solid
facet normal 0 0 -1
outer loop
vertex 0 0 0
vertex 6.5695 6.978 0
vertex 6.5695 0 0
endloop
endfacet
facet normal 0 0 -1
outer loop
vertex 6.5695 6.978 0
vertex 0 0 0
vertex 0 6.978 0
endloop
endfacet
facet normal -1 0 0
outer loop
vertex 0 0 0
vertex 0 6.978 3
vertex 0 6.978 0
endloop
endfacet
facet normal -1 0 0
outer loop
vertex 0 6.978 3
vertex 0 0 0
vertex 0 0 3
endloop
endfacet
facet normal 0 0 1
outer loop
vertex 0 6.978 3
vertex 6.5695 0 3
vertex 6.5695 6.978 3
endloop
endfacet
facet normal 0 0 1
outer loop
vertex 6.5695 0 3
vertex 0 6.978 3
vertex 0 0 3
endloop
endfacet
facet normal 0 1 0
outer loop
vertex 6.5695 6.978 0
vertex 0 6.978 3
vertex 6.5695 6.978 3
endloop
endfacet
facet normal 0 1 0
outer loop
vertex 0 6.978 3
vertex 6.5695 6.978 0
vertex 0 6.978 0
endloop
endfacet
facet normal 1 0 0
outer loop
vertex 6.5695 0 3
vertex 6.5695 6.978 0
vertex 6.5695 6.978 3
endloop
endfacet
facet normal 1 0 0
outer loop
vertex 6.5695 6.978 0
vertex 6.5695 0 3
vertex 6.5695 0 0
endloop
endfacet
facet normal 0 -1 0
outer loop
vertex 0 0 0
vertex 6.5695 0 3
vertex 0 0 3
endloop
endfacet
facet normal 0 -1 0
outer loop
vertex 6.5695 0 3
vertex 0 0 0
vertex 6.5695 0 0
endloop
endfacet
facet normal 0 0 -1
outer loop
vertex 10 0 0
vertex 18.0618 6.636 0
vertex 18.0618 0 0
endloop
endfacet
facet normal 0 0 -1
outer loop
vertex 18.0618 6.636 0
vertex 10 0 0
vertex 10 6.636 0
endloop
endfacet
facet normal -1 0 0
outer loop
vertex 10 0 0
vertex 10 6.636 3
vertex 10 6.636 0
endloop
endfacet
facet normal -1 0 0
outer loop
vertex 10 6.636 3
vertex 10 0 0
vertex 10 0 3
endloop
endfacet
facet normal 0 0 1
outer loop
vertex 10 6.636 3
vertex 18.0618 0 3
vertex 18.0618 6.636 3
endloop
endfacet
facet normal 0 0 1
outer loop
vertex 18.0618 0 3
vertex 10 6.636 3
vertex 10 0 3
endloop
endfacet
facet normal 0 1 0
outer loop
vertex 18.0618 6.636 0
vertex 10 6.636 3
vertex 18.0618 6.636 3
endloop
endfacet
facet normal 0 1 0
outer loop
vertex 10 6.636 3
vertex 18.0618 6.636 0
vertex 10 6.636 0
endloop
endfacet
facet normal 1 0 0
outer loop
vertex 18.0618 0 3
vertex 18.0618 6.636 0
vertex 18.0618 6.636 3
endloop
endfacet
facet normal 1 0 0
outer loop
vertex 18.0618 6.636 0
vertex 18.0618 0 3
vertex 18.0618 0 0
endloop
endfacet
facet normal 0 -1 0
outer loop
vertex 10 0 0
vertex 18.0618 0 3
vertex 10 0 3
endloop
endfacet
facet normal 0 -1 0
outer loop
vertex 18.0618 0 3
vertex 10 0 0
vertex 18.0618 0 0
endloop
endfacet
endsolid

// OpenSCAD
module Bricks(){
    colors = ["#cb6b6b","#dd7d7d","#9e3333","#842020"];

    single_rand = rands(5,10,1)[0];
    single_rand2 = rands(5,10,1)[0];

    index_color = rands(0,3,1)[0]; // get a single number

    color(colors[index_color])
    linear_extrude(height = 3){
    square([single_rand,single_rand2]);
    }
}

Bricks();

translate([10,0,0])
Bricks();

// Written by Nicolì Angelo (Gengio) 2024: 
// MIT License


//Permission is hereby granted, free of charge, to any person obtaining a copy of this software and associated documentation files (the "Software"), to deal in the Software without restriction, including without limitation the rights to use, copy, modify, merge, publish, distribute, sublicense, and/or sell copies of the Software, and to permit persons to whom the Software is furnished to do so, subject to the following conditions:

//The above copyright notice and this permission notice shall be included in all copies or substantial portions of the Software.

//THE SOFTWARE IS PROVIDED "AS IS", WITHOUT WARRANTY OF ANY KIND, EXPRESS OR IMPLIED, INCLUDING BUT NOT LIMITED TO THE WARRANTIES OF MERCHANTABILITY, FITNESS FOR A PARTICULAR PURPOSE AND NONINFRINGEMENT. IN NO EVENT SHALL THE AUTHORS OR COPYRIGHT HOLDERS BE LIABLE FOR ANY CLAIM, DAMAGES OR OTHER LIABILITY, WHETHER IN AN ACTION OF CONTRACT, TORT OR OTHERWISE, ARISING FROM, OUT OF OR IN CONNECTION WITH THE SOFTWARE OR THE USE OR OTHER DEALINGS IN THE SOFTWARE.
